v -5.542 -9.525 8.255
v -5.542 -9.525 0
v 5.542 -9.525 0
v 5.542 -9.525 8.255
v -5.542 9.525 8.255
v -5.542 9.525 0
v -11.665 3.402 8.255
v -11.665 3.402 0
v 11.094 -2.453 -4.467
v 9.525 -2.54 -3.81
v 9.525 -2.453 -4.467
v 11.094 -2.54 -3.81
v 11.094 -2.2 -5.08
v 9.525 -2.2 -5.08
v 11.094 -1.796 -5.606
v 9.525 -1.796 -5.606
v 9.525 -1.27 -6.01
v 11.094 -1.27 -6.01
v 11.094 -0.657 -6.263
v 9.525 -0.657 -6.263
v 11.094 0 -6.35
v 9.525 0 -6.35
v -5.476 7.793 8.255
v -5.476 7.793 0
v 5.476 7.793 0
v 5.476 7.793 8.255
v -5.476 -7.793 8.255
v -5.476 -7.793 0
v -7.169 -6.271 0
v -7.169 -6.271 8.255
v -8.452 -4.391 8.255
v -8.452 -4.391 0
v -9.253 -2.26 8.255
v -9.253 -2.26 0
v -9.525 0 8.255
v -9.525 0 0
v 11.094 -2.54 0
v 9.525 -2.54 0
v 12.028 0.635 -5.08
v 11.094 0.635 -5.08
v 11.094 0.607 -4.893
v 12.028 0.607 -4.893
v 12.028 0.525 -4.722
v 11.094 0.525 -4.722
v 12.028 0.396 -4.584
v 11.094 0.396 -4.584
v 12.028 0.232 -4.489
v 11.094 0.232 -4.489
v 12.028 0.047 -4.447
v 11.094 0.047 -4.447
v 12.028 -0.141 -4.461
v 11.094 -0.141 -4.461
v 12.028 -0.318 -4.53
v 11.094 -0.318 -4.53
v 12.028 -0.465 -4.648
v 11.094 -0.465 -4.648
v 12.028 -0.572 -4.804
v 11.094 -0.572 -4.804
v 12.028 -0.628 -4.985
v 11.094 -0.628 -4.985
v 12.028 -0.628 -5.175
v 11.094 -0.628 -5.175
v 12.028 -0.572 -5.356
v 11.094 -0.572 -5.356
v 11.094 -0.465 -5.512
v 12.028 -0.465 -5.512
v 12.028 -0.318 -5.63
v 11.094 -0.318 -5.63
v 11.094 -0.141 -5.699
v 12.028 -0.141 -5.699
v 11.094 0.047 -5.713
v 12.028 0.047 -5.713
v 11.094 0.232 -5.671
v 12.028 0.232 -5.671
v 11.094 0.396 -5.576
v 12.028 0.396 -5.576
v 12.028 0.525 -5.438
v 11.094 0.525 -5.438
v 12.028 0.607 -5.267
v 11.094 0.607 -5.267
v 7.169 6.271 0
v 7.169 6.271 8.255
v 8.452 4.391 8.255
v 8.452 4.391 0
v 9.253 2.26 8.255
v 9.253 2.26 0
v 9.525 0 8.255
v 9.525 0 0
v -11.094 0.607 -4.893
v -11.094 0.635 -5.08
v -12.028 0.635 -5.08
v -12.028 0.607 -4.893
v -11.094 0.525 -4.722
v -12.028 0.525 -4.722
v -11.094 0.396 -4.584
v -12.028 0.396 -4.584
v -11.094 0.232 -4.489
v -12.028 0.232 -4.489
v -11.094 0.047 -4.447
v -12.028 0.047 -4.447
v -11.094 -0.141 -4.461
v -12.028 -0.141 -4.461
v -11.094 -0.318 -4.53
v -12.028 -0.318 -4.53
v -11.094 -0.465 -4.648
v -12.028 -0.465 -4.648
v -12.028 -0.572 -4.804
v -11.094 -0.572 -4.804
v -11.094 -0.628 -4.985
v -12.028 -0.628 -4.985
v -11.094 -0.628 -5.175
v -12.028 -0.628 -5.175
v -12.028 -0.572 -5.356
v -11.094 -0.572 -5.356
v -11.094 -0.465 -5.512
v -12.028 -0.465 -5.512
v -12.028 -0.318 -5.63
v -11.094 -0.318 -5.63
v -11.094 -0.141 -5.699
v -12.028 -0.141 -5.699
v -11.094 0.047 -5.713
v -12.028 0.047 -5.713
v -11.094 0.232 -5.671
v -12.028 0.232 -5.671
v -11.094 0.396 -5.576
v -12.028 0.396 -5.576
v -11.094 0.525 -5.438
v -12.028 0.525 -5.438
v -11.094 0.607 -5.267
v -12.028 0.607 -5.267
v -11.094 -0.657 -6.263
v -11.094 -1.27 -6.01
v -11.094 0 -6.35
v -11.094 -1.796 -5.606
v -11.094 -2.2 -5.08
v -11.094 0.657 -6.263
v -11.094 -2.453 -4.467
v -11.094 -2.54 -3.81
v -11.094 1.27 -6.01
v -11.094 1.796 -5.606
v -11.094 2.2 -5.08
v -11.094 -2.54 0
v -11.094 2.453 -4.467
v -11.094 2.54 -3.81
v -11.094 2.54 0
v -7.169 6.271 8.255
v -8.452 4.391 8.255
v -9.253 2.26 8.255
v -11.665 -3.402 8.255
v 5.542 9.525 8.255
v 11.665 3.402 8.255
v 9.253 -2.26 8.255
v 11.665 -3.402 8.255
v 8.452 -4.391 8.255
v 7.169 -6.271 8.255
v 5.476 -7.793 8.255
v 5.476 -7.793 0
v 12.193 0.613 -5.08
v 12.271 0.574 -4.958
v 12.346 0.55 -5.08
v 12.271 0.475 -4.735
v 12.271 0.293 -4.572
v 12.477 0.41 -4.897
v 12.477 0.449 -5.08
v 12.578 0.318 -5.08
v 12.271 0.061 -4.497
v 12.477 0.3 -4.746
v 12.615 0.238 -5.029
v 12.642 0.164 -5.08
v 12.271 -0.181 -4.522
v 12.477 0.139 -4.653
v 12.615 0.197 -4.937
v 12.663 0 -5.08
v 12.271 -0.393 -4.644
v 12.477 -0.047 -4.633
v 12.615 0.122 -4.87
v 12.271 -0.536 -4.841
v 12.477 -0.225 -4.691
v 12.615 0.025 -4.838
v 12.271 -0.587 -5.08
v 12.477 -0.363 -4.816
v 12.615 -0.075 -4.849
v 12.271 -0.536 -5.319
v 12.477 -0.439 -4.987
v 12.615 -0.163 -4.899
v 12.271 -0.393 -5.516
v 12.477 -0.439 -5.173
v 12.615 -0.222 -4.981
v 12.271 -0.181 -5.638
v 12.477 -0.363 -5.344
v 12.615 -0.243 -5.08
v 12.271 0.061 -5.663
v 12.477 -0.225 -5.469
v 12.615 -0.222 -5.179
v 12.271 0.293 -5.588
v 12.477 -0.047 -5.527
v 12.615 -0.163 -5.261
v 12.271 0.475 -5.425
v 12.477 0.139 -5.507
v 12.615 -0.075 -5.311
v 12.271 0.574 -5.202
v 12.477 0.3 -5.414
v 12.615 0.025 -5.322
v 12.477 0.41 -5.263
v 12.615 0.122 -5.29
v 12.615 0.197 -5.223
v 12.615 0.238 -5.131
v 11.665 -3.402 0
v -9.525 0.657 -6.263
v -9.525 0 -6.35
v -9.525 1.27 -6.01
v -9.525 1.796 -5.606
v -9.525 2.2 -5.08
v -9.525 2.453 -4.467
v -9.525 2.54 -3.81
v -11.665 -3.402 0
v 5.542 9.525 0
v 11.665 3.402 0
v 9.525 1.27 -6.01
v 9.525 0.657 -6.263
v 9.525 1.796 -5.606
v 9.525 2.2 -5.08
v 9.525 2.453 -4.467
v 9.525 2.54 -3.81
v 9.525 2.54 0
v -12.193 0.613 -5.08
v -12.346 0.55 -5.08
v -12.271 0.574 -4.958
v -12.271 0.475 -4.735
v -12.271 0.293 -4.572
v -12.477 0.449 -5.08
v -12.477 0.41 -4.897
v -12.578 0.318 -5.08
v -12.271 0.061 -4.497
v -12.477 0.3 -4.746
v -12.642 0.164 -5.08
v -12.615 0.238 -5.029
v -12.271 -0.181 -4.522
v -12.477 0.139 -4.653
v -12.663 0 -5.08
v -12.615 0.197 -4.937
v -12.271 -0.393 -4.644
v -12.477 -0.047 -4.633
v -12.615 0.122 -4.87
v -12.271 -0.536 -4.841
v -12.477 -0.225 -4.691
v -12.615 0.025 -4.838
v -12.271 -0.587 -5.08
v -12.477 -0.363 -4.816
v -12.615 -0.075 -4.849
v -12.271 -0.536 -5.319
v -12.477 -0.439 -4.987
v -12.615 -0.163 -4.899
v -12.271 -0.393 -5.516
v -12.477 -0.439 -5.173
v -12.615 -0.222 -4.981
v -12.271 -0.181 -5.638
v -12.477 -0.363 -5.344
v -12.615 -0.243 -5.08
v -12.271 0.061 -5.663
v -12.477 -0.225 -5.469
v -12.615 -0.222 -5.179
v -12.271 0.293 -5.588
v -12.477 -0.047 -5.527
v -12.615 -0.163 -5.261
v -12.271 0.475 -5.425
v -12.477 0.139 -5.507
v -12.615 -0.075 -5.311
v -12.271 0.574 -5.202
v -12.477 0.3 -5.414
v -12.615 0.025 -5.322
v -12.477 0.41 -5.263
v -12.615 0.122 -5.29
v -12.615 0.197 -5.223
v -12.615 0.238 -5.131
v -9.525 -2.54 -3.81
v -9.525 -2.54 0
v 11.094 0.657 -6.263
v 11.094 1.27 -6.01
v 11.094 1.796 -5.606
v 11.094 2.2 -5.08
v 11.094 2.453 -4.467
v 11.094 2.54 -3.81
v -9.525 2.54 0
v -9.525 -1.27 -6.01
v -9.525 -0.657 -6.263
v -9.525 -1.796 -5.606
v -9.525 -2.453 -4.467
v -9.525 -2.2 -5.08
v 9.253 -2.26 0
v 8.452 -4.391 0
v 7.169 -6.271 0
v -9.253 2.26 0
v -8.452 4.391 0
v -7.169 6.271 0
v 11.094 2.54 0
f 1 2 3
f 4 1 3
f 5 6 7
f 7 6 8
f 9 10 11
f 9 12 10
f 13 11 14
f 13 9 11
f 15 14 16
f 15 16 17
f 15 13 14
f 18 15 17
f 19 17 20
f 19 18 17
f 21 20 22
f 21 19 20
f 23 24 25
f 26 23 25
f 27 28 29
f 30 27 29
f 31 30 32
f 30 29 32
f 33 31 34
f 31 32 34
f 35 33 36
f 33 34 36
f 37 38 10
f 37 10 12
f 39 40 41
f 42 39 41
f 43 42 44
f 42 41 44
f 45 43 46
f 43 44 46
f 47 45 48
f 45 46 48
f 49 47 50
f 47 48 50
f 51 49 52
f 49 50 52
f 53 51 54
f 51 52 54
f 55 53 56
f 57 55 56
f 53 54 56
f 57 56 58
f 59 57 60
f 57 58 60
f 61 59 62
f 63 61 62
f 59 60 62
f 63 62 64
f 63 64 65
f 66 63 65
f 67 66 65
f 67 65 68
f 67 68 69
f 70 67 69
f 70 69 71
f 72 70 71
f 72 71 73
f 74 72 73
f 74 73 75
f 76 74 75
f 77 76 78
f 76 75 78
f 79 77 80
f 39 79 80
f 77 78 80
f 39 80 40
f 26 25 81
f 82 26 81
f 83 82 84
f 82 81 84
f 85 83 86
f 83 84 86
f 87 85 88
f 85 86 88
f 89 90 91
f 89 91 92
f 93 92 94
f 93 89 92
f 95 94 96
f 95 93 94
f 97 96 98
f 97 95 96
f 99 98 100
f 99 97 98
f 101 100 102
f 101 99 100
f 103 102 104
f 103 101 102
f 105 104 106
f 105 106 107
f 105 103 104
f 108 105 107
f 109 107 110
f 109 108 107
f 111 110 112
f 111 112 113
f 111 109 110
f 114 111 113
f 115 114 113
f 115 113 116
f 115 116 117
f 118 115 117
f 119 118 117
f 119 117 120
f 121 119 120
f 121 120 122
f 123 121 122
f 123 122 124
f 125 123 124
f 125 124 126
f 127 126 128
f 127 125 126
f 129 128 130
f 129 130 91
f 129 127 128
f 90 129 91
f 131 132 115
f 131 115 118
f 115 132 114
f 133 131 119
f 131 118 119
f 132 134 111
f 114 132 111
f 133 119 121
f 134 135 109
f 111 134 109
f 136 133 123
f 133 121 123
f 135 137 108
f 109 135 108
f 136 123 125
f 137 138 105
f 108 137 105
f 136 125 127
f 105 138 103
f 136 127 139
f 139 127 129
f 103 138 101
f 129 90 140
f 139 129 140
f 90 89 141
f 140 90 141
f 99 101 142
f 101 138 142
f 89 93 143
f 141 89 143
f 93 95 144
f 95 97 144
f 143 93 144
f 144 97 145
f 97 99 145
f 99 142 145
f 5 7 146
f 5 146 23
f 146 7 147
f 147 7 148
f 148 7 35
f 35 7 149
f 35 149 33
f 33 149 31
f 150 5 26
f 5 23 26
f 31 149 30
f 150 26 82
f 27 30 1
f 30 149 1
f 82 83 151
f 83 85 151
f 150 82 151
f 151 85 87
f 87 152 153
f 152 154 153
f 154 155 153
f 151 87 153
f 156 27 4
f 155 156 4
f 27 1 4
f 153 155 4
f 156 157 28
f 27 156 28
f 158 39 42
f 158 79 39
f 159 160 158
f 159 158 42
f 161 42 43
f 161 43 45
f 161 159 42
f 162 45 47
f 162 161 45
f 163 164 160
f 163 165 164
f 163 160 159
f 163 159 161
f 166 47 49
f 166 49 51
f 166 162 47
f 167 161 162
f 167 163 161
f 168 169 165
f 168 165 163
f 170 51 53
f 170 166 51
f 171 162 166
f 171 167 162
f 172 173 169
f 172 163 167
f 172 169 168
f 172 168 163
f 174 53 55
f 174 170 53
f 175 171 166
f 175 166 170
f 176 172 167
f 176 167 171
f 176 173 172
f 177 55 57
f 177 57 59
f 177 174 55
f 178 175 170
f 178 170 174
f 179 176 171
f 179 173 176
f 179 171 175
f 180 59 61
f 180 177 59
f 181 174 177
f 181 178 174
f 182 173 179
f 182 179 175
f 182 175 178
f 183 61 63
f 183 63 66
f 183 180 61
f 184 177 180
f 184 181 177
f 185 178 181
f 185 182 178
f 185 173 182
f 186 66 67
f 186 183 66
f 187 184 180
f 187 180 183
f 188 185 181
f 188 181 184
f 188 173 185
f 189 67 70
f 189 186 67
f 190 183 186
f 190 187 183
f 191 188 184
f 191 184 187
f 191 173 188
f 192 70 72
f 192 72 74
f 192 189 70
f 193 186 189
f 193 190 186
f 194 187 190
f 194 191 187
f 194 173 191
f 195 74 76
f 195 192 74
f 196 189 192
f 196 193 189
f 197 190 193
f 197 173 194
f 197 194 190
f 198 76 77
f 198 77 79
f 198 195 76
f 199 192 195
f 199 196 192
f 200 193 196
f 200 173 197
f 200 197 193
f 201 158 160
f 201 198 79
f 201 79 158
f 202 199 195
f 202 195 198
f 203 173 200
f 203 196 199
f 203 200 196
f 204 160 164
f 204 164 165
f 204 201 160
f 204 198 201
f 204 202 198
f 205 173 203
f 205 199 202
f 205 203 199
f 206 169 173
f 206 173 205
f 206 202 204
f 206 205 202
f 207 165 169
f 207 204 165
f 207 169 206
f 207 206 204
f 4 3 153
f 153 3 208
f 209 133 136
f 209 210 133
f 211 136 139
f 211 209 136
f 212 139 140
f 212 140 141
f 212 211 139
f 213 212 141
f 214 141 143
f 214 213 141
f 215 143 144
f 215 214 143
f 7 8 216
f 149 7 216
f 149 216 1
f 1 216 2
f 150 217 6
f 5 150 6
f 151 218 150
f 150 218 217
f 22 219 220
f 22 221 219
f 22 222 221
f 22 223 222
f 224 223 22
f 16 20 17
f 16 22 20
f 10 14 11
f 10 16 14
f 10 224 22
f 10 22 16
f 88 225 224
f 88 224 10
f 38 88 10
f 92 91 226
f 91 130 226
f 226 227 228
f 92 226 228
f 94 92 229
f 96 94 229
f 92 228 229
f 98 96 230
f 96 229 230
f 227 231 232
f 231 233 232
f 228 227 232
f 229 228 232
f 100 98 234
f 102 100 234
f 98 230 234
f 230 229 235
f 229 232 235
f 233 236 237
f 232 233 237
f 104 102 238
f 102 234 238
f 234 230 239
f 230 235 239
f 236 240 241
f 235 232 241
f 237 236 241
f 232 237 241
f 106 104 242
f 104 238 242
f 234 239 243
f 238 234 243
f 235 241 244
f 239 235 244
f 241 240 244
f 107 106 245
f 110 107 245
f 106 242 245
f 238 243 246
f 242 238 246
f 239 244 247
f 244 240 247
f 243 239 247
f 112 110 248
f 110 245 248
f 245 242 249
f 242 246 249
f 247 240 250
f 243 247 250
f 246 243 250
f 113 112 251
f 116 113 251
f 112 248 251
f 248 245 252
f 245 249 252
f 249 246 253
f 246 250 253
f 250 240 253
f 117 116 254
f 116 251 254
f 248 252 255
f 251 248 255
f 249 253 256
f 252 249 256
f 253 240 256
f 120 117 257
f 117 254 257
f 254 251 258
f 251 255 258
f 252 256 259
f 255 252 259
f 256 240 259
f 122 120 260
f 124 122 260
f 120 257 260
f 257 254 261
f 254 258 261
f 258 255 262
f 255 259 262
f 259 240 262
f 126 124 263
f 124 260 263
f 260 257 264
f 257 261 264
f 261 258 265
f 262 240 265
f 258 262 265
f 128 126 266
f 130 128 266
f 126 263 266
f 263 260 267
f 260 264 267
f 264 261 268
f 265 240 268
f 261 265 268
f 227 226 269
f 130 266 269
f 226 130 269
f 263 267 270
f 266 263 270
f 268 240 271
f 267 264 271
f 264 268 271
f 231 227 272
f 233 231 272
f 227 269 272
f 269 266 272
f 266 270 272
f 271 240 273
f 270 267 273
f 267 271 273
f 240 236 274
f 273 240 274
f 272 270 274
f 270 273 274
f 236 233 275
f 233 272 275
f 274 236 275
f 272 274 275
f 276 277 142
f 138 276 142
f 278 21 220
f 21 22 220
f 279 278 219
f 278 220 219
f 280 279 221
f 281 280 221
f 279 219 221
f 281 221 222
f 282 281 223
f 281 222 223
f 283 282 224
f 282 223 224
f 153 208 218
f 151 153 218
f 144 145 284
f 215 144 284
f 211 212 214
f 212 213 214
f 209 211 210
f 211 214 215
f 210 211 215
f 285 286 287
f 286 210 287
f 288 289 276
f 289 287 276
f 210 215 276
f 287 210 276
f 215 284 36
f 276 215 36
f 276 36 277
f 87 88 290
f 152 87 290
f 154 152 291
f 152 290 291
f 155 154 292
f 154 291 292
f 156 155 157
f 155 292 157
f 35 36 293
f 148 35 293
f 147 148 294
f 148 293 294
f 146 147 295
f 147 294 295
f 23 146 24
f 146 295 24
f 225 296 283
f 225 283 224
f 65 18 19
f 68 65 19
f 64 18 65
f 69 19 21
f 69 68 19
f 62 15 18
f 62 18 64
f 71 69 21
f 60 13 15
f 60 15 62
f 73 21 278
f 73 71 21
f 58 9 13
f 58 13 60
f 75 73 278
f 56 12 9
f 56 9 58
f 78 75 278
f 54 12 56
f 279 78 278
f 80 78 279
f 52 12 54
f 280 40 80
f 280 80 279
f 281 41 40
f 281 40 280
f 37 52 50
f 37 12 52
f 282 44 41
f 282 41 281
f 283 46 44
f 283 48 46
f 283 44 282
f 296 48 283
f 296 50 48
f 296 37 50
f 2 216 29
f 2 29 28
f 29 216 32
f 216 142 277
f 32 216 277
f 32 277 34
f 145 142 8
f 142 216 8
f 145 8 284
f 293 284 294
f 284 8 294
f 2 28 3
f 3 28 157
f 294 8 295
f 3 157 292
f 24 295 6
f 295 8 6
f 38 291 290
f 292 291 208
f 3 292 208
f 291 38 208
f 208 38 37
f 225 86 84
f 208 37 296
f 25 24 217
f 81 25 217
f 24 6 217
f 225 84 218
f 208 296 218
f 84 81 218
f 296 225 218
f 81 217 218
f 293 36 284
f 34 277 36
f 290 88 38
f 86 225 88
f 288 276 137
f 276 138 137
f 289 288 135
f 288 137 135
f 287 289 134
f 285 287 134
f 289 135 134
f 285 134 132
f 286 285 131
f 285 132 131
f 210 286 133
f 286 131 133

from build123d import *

# Parameters (mm, degrees)
F1_DEPTH  = 16.51
F3_DEPTH  = 6.35
F4_R      = 0.635
F5_DEPTH  = 1.5691231
F6_R      = 2.53999
F7_R      = 0.635
F9_DEPTH  = 6.35
F11_D     = 2.54
F16_D     = 127
F16_DEPTH = 14.606


# Not quite as in the source:
# - a fillet or chamfer is up to 0.001 mm smaller than in the source, because OpenCascade refuses the exact size
# - a length typed as a fraction of an inch, garbled in the dataset ("3 / 203.2 mm" for 3/8 in), is restored
# - the program builds the solid bodies; features that only make, move or delete a surface that nothing else refers to are left out


with BuildPart() as f1:
    # F0 (on Top) → F1 (new body)
    with BuildSketch(Plane.XY):
        Polygon((5.5418181818, 9.525), (0, 9.525), (-5.5418181818, 9.525), (-11.6647200825, 3.4020980993), (-11.6647200825, 0), (-11.6647200825, -3.4020980993), (-5.5418181818, -9.525), (0, -9.525), (5.5418181818, -9.525), (11.6647200825, -3.4020980993), (11.6647200825, 0), (11.6647200825, 3.4020980993), align=None)
        with BuildLine():
            ThreePointArc((5.4764899478, 7.7931818182), (8.4524905132, 4.3910168667), (9.525, 0))
            ThreePointArc((9.525, 0), (8.4524905132, -4.3910168667), (5.4764899478, -7.7931818182))
            Line((5.4764899478, -7.7931818182), (0, -7.7931818182))
            Line((0, -7.7931818182), (-5.4764899478, -7.7931818182))
            ThreePointArc((-5.4764899478, -7.7931818182), (-8.4524905132, -4.3910168667), (-9.525, 0))
            ThreePointArc((-9.525, 0), (-8.4524905132, 4.3910168667), (-5.4764899478, 7.7931818182))
            Line((-5.4764899478, 7.7931818182), (0, 7.7931818182))
            Line((0, 7.7931818182), (5.4764899478, 7.7931818182))
        make_face(mode=Mode.SUBTRACT)
    extrude(amount=F1_DEPTH)

    # F2 (on Top) → F3 (join)
    with BuildSketch(Plane.XY):
        Polygon((11.0941231, -2.54), (11.0941231, 0), (11.0941231, 2.54), (9.525, 2.54), (9.525, 0), (9.525, -2.54), align=None)
    extrude(amount=-F3_DEPTH)

    # F4 (on face) → F5 (join)
    with BuildSketch(Plane.YZ.offset(11.0941231)):
        with Locations((0, -5.08)):
            Circle(F4_R)
    extrude(amount=F5_DEPTH)

    # F6 (radius 2.54 in the source; OpenCascade refuses exactly that, so slightly less here)
    f6_edges = [f1.edges().sort_by_distance(p)[0] for p in [
        (10.309562, -2.54, -6.35),
        (10.309562, 2.54, -6.35),
    ]]
    fillet(f6_edges, radius=F6_R)

    # F7
    f7_edges = [f1.edges().sort_by_distance(p)[0] for p in [
        (12.663246, -0.635, -5.08),
    ]]
    fillet(f7_edges, radius=F7_R)

    # F8 (on face) → F9 (join)
    with BuildSketch(Plane.XY.offset(16.51)):
        Polygon((11.6647200825, 2.54), (10.095592022, 2.54), (10.095592022, 0), (10.095592022, -2.54), (11.6647200825, -2.54), (11.6647200825, 0), align=None)
    extrude(amount=F9_DEPTH)

    # F11 (through all)
    with Locations(Plane.YZ.offset(11.6647200825)):
        with Locations((0, 20.32)):
            Hole(F11_D / 2)

    # F12: F1 across plane


with BuildPart() as f1_1:
    add(f1.part)
    add(f1.part.mirror(Plane.YZ))

    # F16 (through all, one way)
    with BuildSketch(Plane(origin=(0, 0, 8.255), x_dir=(1, 0, 0), z_dir=(0, 0, -1))):
        with Locations((0, 0)):
            Circle(F16_D / 2)
    extrude(amount=-F16_DEPTH, mode=Mode.SUBTRACT)


solid = f1_1.part
